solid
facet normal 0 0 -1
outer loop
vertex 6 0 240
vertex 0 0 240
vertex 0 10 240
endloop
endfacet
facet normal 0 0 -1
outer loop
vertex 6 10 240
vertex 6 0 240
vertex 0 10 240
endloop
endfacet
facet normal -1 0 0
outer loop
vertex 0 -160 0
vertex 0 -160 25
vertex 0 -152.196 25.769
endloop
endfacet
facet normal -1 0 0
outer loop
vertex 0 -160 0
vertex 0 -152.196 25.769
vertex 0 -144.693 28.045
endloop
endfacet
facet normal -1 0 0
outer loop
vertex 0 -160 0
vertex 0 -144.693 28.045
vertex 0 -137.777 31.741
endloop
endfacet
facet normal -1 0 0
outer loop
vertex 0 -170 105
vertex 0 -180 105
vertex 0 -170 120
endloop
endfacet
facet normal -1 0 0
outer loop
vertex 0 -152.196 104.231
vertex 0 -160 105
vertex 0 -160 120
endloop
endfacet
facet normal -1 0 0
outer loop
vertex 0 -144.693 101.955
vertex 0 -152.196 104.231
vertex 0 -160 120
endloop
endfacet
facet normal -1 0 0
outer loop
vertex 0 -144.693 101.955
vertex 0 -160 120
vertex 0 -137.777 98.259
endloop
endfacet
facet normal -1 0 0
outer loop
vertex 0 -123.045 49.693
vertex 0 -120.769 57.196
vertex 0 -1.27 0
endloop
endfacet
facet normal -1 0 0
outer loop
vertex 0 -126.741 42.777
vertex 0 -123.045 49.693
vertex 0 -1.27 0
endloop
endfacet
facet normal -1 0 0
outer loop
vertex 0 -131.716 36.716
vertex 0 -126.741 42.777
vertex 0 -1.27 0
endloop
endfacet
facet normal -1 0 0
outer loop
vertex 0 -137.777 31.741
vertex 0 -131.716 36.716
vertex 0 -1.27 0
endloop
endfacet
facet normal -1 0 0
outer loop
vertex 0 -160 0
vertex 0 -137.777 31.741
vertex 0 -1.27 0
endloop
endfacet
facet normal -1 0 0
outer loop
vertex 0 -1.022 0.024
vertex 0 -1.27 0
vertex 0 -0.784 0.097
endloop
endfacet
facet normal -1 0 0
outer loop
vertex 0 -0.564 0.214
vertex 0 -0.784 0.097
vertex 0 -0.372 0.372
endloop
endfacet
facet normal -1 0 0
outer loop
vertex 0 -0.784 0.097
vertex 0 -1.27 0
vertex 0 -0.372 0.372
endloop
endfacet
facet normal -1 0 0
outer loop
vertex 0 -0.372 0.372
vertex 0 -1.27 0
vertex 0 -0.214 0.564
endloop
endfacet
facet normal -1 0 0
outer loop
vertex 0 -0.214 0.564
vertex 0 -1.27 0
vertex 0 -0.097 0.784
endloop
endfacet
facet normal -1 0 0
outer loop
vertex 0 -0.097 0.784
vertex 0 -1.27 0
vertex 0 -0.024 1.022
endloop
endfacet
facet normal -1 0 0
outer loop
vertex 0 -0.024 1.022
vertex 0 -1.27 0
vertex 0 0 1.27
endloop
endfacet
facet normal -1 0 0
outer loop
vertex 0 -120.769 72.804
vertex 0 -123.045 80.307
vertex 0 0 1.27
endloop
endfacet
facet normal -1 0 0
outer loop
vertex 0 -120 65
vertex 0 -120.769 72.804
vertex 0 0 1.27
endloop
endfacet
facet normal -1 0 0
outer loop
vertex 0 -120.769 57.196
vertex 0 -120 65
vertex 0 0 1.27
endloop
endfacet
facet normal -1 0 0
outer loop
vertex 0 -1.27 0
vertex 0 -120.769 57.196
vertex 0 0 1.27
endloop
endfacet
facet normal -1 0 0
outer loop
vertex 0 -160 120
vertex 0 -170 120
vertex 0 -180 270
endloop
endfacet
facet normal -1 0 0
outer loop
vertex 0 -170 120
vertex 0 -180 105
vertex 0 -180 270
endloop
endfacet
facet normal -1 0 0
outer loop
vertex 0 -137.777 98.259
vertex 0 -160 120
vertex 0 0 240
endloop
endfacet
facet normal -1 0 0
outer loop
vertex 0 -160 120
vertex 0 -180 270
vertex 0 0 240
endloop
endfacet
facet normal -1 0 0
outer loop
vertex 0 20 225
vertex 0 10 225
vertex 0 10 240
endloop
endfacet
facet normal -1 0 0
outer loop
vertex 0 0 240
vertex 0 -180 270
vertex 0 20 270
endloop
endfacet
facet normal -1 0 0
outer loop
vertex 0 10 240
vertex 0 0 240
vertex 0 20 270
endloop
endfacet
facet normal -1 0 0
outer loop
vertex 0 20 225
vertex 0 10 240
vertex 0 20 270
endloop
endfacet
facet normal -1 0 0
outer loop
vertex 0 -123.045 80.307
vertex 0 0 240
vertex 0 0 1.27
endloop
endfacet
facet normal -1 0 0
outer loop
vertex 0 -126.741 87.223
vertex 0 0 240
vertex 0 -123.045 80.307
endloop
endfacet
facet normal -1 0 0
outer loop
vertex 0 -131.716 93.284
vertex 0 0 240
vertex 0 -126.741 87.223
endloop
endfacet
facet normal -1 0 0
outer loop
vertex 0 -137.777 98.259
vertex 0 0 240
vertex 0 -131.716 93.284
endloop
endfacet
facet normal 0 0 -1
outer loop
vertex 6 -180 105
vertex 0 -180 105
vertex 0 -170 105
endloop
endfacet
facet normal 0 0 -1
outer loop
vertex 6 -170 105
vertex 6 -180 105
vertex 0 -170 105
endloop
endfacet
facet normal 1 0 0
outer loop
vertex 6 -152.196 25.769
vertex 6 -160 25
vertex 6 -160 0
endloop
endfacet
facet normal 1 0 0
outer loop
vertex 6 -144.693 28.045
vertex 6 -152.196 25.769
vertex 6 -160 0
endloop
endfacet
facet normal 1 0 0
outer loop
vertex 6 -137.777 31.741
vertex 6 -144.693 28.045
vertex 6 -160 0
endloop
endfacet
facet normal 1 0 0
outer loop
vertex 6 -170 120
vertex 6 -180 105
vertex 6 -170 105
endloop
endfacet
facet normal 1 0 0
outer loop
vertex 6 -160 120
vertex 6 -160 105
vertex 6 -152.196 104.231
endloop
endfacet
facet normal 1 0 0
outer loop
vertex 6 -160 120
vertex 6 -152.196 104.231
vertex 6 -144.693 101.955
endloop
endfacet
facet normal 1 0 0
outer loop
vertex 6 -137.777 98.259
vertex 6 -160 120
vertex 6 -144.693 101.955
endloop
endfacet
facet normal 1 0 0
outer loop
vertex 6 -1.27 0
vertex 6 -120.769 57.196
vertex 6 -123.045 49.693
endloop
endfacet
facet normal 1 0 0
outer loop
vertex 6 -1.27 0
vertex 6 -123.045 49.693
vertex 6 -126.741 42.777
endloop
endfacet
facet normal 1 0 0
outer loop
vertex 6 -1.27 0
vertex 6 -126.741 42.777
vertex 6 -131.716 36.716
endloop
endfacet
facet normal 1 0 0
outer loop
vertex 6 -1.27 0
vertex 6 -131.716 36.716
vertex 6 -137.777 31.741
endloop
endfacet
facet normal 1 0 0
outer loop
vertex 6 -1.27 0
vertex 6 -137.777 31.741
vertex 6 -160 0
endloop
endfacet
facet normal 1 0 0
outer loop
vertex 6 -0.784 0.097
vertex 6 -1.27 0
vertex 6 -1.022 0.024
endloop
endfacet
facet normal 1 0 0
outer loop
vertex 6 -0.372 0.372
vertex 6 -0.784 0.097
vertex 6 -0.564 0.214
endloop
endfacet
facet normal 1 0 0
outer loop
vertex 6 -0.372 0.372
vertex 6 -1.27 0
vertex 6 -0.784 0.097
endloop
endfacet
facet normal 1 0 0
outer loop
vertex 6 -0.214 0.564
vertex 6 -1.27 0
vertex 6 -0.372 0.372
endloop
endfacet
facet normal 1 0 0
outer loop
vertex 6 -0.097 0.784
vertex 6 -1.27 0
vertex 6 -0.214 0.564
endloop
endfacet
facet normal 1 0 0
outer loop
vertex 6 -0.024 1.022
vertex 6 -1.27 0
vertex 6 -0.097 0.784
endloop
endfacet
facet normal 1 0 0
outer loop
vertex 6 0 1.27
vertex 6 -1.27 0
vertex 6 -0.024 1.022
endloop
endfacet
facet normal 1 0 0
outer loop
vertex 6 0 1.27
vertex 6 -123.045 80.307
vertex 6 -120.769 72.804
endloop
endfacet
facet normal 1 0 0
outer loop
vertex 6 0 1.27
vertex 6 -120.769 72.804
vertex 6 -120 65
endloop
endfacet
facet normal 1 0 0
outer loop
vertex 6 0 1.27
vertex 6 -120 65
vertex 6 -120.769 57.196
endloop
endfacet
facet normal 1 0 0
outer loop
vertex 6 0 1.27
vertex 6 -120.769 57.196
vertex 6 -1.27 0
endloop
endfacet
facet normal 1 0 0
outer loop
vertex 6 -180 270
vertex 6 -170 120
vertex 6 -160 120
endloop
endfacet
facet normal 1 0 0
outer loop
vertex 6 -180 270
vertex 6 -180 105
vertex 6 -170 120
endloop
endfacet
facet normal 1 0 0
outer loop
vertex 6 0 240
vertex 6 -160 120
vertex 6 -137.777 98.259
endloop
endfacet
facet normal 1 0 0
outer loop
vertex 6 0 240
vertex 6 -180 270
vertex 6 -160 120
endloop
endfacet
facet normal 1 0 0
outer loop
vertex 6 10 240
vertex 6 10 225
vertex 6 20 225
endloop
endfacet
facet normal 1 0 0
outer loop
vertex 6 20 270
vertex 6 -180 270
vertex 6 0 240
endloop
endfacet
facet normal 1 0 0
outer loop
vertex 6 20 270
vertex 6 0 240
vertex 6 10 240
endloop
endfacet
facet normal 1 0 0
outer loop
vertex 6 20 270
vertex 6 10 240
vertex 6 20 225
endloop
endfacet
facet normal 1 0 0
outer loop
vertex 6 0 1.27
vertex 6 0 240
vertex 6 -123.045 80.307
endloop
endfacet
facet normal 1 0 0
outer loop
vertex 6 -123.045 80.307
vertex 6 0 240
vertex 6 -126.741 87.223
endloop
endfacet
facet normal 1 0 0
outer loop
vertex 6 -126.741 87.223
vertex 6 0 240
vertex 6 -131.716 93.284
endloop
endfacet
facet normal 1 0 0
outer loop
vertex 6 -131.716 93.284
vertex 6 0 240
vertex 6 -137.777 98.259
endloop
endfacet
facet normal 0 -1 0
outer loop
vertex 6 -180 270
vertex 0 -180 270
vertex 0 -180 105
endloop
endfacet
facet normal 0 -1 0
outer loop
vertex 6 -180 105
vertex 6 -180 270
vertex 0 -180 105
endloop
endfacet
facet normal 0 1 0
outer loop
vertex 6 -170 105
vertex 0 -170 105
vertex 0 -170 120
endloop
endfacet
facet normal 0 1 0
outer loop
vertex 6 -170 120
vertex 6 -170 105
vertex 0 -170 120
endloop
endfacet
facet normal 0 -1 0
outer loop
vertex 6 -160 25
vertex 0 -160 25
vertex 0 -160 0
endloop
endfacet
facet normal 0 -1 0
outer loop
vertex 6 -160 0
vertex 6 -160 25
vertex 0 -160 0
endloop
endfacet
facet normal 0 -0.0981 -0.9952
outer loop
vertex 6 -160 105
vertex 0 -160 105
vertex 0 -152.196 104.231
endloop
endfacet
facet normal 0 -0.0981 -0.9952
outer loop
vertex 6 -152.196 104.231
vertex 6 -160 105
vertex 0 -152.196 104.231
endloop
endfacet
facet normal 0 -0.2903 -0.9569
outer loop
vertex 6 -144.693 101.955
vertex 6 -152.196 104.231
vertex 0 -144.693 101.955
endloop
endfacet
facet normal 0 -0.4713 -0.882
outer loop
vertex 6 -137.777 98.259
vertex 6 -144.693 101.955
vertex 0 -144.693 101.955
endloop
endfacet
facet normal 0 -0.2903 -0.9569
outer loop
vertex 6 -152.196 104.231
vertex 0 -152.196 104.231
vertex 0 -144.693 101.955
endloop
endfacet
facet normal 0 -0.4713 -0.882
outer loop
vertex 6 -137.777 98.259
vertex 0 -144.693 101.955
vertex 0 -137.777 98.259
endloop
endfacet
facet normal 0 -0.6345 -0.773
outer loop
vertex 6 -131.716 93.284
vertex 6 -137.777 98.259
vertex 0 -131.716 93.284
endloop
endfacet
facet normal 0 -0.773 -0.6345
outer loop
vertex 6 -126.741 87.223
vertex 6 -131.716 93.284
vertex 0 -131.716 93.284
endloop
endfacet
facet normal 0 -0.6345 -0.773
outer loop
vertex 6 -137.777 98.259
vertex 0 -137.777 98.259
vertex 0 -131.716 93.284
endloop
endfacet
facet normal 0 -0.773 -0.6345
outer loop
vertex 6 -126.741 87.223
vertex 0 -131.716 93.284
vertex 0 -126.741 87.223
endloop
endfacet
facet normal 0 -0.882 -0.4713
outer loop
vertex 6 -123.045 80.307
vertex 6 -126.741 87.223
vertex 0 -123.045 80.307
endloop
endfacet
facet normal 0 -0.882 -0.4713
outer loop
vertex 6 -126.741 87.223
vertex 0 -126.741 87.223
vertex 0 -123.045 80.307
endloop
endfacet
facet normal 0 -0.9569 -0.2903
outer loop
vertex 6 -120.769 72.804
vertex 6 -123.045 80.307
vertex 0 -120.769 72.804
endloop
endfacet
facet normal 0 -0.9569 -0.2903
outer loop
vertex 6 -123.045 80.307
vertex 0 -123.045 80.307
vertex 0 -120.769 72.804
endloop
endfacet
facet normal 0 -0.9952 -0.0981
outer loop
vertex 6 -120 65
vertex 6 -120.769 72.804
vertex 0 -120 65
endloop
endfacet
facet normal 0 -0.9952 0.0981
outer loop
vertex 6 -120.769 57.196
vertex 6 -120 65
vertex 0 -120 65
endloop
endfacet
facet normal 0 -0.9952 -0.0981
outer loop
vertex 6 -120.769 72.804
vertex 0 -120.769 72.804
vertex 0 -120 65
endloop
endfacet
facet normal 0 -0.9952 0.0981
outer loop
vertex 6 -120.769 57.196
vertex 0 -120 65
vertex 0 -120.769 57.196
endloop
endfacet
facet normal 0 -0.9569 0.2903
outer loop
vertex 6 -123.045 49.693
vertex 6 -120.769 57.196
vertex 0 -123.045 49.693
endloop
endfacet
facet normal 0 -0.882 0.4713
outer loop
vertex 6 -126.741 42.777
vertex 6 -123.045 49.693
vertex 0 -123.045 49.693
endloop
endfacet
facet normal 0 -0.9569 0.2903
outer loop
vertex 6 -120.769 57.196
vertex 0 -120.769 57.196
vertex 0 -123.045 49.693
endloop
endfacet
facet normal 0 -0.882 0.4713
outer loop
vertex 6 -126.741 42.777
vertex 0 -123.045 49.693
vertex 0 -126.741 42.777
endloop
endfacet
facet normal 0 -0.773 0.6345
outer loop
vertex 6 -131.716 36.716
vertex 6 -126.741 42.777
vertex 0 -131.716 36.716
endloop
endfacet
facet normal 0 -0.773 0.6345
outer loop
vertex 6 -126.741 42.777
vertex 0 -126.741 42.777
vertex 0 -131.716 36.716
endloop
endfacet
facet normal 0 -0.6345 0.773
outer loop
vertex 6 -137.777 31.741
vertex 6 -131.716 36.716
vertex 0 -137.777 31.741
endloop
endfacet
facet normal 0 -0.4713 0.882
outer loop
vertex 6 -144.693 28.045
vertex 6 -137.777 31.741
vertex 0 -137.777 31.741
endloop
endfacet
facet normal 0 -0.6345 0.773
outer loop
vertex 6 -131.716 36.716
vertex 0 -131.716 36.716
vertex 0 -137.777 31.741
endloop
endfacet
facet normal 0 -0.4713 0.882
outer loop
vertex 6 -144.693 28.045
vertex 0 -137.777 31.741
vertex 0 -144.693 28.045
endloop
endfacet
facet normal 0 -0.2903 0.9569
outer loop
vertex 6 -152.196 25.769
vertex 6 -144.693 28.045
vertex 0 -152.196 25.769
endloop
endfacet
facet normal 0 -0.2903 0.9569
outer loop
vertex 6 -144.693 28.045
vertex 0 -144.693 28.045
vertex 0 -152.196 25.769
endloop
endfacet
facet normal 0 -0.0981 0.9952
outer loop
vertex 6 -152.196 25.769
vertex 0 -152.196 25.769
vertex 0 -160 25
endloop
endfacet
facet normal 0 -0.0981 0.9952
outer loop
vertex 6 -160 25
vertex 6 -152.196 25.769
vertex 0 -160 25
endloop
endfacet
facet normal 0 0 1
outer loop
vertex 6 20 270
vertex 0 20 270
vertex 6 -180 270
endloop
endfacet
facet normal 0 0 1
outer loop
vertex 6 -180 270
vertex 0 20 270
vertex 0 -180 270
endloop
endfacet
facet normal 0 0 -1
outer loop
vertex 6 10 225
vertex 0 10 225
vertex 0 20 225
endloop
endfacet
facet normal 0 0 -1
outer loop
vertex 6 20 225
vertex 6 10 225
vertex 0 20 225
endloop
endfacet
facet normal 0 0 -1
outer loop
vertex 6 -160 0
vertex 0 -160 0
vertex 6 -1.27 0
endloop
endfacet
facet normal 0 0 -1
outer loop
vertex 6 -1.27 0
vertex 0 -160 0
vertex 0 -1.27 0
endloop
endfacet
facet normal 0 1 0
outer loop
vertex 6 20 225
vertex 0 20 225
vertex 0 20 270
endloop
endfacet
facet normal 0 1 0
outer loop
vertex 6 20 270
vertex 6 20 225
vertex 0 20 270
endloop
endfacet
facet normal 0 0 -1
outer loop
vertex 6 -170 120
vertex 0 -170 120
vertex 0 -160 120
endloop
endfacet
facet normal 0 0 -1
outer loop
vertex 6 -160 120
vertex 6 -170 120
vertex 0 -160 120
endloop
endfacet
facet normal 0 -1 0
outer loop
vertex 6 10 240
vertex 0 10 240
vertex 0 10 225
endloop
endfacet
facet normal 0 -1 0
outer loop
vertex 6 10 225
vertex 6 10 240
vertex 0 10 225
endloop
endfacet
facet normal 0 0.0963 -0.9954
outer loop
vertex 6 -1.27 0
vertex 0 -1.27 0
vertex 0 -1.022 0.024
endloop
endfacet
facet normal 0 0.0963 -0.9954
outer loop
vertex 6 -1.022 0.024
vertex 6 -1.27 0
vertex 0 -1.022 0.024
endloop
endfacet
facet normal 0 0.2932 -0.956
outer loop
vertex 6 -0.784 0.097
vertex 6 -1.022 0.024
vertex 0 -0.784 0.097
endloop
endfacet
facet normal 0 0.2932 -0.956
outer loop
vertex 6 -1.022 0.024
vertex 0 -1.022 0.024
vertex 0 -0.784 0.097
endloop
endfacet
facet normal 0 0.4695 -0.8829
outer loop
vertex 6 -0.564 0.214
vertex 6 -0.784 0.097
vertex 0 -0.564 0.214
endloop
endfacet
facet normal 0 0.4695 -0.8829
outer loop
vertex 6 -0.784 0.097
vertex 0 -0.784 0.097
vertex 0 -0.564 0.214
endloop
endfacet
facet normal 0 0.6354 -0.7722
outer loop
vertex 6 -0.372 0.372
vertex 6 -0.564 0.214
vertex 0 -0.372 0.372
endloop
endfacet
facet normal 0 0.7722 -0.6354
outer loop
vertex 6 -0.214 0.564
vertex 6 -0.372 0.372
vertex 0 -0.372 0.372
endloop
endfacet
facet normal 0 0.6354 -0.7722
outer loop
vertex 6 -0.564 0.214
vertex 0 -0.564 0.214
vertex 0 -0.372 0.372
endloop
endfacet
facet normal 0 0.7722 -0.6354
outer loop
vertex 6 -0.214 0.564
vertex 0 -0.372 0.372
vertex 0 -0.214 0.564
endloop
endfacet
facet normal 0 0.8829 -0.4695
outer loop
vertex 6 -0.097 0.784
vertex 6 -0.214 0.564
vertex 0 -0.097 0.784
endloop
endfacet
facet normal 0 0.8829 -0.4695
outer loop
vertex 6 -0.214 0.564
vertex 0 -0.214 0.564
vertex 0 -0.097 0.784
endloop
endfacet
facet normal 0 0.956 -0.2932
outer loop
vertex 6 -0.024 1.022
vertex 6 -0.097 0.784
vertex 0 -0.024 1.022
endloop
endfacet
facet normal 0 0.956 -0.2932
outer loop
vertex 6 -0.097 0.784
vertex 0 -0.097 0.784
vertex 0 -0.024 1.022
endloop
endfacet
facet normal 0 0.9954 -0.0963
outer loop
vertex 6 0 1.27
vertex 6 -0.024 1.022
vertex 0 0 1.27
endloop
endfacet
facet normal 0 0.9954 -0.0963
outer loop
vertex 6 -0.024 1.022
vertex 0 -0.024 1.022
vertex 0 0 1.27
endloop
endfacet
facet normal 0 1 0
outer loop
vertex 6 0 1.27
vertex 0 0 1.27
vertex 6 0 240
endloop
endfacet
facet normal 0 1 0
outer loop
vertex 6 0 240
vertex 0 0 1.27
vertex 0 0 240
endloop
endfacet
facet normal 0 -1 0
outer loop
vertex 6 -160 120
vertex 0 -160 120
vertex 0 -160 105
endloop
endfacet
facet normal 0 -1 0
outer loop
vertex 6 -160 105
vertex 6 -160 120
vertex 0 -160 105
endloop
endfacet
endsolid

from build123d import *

# Parameters (mm, degrees)
F1_DEPTH = 6


with BuildPart() as f1:
    # F0 (on Right) → F1 (new body)
    with BuildSketch(Plane.YZ):
        with BuildLine():
            Line((-160, 0), (-1.27, 0))
            ThreePointArc((-1.27, 0), (-0.371974, 0.371974), (0, 1.27))
            Line((0, 1.27), (0, 240))
            Line((0, 240), (0, 248.73))
            ThreePointArc((0, 248.73), (-0.371974, 249.628026), (-1.27, 250))
            Line((-1.27, 250), (-158.73, 250))
            ThreePointArc((-158.73, 250), (-159.628026, 249.628026), (-160, 248.73))
            Line((-160, 248.73), (-160, 120))
            Line((-160, 120), (-160, 105))
            ThreePointArc((-160, 105), (-120, 65), (-160, 25))
            Line((-160, 25), (-160, 0))
        make_face()
        with BuildLine():
            Line((0, 248.73), (0, 240))
            Line((0, 240), (10, 240))
            Line((10, 240), (10, 225))
            Line((10, 225), (20, 225))
            Line((20, 225), (20, 270))
            Line((20, 270), (-180, 270))
            Line((-180, 270), (-180, 105))
            Line((-180, 105), (-170, 105))
            Line((-170, 105), (-170, 120))
            Line((-170, 120), (-160, 120))
            Line((-160, 120), (-160, 248.73))
            ThreePointArc((-160, 248.73), (-159.628026, 249.628026), (-158.73, 250))
            Line((-158.73, 250), (-1.27, 250))
            ThreePointArc((-1.27, 250), (-0.371974, 249.628026), (0, 248.73))
        make_face()
    extrude(amount=F1_DEPTH)


solid = f1.part
